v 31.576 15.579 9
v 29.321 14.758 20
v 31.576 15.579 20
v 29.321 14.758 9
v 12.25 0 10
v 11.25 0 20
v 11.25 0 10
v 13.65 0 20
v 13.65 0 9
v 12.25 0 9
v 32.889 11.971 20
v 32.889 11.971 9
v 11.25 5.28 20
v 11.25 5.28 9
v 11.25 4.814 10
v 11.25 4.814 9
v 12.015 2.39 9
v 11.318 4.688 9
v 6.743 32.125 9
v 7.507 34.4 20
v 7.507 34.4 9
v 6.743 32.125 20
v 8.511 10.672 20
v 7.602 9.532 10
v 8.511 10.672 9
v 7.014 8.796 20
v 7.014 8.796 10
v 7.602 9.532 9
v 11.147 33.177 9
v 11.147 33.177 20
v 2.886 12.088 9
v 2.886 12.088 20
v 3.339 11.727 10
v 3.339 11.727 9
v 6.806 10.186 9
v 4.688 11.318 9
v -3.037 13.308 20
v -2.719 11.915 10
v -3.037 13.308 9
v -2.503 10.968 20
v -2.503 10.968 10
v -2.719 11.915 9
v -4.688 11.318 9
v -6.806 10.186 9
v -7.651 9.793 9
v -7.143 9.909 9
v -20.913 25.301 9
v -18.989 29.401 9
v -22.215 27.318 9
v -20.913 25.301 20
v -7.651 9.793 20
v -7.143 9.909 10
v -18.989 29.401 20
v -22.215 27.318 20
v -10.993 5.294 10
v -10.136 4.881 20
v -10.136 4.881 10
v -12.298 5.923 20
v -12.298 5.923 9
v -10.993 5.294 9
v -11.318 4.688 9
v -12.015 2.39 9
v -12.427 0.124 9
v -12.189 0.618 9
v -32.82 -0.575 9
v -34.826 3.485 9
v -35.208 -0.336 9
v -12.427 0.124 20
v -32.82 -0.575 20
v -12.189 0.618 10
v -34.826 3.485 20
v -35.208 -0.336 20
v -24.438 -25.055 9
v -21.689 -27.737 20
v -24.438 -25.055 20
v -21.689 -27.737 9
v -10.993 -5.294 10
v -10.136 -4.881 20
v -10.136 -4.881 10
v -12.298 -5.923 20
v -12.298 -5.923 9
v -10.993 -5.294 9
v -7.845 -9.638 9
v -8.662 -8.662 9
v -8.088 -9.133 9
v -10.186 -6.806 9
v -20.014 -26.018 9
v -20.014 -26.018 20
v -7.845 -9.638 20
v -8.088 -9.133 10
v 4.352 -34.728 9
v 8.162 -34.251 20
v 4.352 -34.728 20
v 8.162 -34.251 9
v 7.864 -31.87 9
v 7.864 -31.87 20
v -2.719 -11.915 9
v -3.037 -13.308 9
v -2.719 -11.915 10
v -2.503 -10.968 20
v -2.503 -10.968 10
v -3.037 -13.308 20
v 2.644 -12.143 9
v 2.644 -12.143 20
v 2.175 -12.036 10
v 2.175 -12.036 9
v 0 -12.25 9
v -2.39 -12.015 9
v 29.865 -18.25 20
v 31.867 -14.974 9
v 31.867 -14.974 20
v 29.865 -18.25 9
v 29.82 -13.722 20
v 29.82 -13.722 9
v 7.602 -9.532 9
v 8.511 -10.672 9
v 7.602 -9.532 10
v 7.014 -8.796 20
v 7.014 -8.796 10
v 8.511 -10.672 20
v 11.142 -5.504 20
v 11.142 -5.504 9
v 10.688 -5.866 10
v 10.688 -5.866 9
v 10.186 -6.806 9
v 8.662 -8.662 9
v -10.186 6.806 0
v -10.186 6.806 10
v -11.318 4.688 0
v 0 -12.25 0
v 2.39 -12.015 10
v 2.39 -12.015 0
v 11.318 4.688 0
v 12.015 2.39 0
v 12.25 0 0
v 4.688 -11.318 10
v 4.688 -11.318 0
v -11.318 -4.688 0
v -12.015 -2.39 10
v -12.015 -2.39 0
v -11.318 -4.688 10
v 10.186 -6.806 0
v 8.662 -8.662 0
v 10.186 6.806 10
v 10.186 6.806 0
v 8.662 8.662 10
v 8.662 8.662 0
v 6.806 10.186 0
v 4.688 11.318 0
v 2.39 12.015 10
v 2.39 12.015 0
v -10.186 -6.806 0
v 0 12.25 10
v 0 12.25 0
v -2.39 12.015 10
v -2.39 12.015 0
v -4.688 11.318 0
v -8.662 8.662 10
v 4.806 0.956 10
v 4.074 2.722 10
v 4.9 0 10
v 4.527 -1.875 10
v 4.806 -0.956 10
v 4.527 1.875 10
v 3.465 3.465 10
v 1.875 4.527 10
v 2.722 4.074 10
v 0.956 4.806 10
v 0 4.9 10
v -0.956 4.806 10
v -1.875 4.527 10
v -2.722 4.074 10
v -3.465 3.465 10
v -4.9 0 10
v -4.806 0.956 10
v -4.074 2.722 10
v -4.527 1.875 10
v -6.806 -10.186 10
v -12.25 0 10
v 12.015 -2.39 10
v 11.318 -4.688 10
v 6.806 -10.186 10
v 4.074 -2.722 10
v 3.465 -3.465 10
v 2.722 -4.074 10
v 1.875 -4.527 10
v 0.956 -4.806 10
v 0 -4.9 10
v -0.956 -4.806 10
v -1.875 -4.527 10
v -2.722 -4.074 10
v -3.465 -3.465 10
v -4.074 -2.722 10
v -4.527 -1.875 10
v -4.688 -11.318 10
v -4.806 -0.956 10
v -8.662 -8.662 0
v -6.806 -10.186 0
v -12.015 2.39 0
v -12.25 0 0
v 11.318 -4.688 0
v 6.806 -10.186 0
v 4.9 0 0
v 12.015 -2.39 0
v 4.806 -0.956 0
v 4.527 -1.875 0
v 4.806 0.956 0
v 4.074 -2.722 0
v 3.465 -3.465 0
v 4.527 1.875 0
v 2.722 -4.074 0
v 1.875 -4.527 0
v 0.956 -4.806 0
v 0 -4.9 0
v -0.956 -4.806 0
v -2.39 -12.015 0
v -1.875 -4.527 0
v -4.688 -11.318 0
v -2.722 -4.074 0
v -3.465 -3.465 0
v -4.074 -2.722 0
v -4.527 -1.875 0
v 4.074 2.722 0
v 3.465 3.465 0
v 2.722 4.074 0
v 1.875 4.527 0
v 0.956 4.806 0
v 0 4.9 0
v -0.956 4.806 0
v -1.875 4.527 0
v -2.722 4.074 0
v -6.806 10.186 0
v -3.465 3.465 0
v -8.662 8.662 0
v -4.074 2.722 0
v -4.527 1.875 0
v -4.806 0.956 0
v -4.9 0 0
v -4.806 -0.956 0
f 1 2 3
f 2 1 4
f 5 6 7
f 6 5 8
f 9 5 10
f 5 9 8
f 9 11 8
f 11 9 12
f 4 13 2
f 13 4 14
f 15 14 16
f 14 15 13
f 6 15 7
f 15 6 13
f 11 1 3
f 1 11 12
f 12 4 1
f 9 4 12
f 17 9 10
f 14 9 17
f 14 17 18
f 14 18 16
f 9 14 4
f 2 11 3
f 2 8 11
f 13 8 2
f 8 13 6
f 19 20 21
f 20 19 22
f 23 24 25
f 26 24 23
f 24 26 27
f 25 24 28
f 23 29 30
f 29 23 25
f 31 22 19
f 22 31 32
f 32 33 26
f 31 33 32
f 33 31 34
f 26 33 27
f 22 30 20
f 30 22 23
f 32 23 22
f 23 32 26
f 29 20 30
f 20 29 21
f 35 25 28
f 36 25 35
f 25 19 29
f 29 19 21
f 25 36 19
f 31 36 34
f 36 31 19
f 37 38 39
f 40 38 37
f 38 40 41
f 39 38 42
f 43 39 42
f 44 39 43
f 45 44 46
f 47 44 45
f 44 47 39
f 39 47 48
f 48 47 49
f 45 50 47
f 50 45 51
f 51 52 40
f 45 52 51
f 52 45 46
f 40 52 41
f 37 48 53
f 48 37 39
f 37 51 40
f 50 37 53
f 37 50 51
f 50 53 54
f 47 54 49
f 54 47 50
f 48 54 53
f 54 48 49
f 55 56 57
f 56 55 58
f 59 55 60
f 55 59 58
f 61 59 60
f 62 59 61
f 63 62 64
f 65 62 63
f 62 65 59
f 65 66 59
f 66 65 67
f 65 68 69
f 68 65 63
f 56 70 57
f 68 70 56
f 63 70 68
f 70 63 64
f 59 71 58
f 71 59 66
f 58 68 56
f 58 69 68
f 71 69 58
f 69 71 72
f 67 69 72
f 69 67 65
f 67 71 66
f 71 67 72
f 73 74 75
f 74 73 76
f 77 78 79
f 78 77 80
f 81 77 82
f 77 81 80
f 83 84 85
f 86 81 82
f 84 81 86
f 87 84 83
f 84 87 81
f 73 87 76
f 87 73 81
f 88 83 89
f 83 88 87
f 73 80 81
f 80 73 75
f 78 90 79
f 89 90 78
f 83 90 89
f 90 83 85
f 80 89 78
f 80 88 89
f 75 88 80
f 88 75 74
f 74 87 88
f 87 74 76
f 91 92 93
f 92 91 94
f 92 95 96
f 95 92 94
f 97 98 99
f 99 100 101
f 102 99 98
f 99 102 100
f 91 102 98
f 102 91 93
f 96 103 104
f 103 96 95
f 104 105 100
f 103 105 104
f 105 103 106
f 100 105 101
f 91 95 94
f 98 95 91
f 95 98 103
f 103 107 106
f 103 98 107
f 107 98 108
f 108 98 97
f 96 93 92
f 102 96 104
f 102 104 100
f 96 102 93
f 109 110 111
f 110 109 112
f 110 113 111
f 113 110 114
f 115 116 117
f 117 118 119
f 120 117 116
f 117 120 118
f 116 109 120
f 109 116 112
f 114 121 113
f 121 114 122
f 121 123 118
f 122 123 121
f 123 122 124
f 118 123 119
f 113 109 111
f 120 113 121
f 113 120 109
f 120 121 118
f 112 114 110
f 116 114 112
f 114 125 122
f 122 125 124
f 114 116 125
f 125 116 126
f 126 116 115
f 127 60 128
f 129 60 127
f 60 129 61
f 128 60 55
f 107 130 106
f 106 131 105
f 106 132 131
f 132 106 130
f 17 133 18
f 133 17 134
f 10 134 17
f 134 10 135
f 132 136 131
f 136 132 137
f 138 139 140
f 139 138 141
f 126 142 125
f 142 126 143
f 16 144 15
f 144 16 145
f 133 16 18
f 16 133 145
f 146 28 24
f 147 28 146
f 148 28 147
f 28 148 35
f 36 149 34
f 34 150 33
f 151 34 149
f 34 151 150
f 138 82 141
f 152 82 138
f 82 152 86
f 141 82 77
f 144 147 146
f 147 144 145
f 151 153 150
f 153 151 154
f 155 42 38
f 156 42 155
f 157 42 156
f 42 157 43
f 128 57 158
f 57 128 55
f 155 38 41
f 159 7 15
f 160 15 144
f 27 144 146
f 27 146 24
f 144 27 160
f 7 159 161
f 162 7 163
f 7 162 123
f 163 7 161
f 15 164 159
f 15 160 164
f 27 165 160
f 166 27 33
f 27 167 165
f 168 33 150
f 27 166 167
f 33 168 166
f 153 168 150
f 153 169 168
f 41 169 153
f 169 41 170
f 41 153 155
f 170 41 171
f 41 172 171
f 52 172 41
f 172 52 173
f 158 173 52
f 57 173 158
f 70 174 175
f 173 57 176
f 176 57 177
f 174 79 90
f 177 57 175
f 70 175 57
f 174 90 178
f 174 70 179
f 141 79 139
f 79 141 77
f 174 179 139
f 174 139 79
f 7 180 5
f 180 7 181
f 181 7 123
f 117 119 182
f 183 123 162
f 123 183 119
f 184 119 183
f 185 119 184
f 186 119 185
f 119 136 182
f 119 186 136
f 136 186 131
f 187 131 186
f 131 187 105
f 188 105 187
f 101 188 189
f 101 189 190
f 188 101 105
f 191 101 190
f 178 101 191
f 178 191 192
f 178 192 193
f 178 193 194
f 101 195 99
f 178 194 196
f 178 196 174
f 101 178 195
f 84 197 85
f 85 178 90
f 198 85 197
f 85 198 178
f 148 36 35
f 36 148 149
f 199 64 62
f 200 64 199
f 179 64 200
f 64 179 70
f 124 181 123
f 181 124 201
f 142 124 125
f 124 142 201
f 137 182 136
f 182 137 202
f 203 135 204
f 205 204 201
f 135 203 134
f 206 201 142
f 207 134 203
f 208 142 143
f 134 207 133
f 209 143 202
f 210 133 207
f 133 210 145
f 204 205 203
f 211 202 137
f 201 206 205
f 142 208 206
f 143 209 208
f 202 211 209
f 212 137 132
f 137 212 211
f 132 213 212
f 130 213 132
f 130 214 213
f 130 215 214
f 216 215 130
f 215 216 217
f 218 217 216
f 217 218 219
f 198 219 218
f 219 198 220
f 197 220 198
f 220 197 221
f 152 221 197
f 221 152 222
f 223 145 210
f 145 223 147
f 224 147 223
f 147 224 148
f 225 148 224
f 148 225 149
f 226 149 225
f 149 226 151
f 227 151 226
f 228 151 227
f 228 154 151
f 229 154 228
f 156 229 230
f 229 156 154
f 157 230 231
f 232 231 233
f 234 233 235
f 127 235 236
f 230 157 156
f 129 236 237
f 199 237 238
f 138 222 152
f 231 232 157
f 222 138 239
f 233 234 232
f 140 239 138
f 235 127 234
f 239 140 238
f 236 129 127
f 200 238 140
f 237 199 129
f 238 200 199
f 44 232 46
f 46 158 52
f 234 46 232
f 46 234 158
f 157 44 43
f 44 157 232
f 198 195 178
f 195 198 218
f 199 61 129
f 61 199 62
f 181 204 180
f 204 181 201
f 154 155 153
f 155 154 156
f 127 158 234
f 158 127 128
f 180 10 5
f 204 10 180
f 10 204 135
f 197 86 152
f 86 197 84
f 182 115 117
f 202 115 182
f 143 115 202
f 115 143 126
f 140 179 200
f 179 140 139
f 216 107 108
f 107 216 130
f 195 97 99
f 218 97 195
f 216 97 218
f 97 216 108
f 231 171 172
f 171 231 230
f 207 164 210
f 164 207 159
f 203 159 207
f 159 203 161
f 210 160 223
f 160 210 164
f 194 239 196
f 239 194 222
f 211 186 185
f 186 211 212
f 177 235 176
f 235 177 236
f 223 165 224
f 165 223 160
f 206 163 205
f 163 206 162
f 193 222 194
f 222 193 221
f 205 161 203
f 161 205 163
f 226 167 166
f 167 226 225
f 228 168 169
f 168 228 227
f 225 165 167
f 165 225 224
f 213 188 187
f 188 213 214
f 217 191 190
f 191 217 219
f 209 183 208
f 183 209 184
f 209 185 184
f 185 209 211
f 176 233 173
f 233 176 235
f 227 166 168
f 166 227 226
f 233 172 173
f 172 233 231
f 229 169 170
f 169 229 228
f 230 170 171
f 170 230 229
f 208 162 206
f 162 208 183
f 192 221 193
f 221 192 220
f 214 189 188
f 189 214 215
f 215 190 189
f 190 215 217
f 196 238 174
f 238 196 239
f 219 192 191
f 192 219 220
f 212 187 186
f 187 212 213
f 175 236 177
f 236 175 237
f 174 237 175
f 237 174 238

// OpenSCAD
$fn = 32;

// ----------------------------------------------------------------------
// Impeller: 70 mm, 7 blades, 20 mm tall
// ----------------------------------------------------------------------

// --- parameters (mm) ---
center_d = 24.5;          // hub diameter
center_h = 10;            // hub height
wheel_d = 70;             // outer diameter over the blades
blade_count = 7;          // number of blades
blade_t = 2.4;            // blade thickness
blade_h = 10;             // blade height
blade_in_r = 11.25;       // blade root radius
blade_out_r = 32.6;       // blade tip radius
sweep = 20;               // blade sweep, degrees
bore_d = 9.8;             // shaft bore

module hub() {
  cylinder(h = center_h, d = center_d);
}

module blade() {
  /* blade swept between two boxes: hull of the root and the tip section */
  hull() {
    translate([blade_in_r, 0, center_h - 1])
      cube([blade_t, blade_t * 2.2, blade_h + 1], center = false);
    rotate([0, 0, sweep])
      translate([blade_out_r, 0, center_h - 1])
        cube([blade_t, blade_t * 1.6, blade_h + 1], center = false);
  }
}

module blades() {
  for (i = [0 : blade_count - 1])
    rotate([0, 0, i * 360 / blade_count]) blade();
}

difference() {
  union() {
    hub();
    blades();
  }
  translate([0, 0, -1]) cylinder(h = center_h + blade_h + 0 + 3, d = bore_d);
}
